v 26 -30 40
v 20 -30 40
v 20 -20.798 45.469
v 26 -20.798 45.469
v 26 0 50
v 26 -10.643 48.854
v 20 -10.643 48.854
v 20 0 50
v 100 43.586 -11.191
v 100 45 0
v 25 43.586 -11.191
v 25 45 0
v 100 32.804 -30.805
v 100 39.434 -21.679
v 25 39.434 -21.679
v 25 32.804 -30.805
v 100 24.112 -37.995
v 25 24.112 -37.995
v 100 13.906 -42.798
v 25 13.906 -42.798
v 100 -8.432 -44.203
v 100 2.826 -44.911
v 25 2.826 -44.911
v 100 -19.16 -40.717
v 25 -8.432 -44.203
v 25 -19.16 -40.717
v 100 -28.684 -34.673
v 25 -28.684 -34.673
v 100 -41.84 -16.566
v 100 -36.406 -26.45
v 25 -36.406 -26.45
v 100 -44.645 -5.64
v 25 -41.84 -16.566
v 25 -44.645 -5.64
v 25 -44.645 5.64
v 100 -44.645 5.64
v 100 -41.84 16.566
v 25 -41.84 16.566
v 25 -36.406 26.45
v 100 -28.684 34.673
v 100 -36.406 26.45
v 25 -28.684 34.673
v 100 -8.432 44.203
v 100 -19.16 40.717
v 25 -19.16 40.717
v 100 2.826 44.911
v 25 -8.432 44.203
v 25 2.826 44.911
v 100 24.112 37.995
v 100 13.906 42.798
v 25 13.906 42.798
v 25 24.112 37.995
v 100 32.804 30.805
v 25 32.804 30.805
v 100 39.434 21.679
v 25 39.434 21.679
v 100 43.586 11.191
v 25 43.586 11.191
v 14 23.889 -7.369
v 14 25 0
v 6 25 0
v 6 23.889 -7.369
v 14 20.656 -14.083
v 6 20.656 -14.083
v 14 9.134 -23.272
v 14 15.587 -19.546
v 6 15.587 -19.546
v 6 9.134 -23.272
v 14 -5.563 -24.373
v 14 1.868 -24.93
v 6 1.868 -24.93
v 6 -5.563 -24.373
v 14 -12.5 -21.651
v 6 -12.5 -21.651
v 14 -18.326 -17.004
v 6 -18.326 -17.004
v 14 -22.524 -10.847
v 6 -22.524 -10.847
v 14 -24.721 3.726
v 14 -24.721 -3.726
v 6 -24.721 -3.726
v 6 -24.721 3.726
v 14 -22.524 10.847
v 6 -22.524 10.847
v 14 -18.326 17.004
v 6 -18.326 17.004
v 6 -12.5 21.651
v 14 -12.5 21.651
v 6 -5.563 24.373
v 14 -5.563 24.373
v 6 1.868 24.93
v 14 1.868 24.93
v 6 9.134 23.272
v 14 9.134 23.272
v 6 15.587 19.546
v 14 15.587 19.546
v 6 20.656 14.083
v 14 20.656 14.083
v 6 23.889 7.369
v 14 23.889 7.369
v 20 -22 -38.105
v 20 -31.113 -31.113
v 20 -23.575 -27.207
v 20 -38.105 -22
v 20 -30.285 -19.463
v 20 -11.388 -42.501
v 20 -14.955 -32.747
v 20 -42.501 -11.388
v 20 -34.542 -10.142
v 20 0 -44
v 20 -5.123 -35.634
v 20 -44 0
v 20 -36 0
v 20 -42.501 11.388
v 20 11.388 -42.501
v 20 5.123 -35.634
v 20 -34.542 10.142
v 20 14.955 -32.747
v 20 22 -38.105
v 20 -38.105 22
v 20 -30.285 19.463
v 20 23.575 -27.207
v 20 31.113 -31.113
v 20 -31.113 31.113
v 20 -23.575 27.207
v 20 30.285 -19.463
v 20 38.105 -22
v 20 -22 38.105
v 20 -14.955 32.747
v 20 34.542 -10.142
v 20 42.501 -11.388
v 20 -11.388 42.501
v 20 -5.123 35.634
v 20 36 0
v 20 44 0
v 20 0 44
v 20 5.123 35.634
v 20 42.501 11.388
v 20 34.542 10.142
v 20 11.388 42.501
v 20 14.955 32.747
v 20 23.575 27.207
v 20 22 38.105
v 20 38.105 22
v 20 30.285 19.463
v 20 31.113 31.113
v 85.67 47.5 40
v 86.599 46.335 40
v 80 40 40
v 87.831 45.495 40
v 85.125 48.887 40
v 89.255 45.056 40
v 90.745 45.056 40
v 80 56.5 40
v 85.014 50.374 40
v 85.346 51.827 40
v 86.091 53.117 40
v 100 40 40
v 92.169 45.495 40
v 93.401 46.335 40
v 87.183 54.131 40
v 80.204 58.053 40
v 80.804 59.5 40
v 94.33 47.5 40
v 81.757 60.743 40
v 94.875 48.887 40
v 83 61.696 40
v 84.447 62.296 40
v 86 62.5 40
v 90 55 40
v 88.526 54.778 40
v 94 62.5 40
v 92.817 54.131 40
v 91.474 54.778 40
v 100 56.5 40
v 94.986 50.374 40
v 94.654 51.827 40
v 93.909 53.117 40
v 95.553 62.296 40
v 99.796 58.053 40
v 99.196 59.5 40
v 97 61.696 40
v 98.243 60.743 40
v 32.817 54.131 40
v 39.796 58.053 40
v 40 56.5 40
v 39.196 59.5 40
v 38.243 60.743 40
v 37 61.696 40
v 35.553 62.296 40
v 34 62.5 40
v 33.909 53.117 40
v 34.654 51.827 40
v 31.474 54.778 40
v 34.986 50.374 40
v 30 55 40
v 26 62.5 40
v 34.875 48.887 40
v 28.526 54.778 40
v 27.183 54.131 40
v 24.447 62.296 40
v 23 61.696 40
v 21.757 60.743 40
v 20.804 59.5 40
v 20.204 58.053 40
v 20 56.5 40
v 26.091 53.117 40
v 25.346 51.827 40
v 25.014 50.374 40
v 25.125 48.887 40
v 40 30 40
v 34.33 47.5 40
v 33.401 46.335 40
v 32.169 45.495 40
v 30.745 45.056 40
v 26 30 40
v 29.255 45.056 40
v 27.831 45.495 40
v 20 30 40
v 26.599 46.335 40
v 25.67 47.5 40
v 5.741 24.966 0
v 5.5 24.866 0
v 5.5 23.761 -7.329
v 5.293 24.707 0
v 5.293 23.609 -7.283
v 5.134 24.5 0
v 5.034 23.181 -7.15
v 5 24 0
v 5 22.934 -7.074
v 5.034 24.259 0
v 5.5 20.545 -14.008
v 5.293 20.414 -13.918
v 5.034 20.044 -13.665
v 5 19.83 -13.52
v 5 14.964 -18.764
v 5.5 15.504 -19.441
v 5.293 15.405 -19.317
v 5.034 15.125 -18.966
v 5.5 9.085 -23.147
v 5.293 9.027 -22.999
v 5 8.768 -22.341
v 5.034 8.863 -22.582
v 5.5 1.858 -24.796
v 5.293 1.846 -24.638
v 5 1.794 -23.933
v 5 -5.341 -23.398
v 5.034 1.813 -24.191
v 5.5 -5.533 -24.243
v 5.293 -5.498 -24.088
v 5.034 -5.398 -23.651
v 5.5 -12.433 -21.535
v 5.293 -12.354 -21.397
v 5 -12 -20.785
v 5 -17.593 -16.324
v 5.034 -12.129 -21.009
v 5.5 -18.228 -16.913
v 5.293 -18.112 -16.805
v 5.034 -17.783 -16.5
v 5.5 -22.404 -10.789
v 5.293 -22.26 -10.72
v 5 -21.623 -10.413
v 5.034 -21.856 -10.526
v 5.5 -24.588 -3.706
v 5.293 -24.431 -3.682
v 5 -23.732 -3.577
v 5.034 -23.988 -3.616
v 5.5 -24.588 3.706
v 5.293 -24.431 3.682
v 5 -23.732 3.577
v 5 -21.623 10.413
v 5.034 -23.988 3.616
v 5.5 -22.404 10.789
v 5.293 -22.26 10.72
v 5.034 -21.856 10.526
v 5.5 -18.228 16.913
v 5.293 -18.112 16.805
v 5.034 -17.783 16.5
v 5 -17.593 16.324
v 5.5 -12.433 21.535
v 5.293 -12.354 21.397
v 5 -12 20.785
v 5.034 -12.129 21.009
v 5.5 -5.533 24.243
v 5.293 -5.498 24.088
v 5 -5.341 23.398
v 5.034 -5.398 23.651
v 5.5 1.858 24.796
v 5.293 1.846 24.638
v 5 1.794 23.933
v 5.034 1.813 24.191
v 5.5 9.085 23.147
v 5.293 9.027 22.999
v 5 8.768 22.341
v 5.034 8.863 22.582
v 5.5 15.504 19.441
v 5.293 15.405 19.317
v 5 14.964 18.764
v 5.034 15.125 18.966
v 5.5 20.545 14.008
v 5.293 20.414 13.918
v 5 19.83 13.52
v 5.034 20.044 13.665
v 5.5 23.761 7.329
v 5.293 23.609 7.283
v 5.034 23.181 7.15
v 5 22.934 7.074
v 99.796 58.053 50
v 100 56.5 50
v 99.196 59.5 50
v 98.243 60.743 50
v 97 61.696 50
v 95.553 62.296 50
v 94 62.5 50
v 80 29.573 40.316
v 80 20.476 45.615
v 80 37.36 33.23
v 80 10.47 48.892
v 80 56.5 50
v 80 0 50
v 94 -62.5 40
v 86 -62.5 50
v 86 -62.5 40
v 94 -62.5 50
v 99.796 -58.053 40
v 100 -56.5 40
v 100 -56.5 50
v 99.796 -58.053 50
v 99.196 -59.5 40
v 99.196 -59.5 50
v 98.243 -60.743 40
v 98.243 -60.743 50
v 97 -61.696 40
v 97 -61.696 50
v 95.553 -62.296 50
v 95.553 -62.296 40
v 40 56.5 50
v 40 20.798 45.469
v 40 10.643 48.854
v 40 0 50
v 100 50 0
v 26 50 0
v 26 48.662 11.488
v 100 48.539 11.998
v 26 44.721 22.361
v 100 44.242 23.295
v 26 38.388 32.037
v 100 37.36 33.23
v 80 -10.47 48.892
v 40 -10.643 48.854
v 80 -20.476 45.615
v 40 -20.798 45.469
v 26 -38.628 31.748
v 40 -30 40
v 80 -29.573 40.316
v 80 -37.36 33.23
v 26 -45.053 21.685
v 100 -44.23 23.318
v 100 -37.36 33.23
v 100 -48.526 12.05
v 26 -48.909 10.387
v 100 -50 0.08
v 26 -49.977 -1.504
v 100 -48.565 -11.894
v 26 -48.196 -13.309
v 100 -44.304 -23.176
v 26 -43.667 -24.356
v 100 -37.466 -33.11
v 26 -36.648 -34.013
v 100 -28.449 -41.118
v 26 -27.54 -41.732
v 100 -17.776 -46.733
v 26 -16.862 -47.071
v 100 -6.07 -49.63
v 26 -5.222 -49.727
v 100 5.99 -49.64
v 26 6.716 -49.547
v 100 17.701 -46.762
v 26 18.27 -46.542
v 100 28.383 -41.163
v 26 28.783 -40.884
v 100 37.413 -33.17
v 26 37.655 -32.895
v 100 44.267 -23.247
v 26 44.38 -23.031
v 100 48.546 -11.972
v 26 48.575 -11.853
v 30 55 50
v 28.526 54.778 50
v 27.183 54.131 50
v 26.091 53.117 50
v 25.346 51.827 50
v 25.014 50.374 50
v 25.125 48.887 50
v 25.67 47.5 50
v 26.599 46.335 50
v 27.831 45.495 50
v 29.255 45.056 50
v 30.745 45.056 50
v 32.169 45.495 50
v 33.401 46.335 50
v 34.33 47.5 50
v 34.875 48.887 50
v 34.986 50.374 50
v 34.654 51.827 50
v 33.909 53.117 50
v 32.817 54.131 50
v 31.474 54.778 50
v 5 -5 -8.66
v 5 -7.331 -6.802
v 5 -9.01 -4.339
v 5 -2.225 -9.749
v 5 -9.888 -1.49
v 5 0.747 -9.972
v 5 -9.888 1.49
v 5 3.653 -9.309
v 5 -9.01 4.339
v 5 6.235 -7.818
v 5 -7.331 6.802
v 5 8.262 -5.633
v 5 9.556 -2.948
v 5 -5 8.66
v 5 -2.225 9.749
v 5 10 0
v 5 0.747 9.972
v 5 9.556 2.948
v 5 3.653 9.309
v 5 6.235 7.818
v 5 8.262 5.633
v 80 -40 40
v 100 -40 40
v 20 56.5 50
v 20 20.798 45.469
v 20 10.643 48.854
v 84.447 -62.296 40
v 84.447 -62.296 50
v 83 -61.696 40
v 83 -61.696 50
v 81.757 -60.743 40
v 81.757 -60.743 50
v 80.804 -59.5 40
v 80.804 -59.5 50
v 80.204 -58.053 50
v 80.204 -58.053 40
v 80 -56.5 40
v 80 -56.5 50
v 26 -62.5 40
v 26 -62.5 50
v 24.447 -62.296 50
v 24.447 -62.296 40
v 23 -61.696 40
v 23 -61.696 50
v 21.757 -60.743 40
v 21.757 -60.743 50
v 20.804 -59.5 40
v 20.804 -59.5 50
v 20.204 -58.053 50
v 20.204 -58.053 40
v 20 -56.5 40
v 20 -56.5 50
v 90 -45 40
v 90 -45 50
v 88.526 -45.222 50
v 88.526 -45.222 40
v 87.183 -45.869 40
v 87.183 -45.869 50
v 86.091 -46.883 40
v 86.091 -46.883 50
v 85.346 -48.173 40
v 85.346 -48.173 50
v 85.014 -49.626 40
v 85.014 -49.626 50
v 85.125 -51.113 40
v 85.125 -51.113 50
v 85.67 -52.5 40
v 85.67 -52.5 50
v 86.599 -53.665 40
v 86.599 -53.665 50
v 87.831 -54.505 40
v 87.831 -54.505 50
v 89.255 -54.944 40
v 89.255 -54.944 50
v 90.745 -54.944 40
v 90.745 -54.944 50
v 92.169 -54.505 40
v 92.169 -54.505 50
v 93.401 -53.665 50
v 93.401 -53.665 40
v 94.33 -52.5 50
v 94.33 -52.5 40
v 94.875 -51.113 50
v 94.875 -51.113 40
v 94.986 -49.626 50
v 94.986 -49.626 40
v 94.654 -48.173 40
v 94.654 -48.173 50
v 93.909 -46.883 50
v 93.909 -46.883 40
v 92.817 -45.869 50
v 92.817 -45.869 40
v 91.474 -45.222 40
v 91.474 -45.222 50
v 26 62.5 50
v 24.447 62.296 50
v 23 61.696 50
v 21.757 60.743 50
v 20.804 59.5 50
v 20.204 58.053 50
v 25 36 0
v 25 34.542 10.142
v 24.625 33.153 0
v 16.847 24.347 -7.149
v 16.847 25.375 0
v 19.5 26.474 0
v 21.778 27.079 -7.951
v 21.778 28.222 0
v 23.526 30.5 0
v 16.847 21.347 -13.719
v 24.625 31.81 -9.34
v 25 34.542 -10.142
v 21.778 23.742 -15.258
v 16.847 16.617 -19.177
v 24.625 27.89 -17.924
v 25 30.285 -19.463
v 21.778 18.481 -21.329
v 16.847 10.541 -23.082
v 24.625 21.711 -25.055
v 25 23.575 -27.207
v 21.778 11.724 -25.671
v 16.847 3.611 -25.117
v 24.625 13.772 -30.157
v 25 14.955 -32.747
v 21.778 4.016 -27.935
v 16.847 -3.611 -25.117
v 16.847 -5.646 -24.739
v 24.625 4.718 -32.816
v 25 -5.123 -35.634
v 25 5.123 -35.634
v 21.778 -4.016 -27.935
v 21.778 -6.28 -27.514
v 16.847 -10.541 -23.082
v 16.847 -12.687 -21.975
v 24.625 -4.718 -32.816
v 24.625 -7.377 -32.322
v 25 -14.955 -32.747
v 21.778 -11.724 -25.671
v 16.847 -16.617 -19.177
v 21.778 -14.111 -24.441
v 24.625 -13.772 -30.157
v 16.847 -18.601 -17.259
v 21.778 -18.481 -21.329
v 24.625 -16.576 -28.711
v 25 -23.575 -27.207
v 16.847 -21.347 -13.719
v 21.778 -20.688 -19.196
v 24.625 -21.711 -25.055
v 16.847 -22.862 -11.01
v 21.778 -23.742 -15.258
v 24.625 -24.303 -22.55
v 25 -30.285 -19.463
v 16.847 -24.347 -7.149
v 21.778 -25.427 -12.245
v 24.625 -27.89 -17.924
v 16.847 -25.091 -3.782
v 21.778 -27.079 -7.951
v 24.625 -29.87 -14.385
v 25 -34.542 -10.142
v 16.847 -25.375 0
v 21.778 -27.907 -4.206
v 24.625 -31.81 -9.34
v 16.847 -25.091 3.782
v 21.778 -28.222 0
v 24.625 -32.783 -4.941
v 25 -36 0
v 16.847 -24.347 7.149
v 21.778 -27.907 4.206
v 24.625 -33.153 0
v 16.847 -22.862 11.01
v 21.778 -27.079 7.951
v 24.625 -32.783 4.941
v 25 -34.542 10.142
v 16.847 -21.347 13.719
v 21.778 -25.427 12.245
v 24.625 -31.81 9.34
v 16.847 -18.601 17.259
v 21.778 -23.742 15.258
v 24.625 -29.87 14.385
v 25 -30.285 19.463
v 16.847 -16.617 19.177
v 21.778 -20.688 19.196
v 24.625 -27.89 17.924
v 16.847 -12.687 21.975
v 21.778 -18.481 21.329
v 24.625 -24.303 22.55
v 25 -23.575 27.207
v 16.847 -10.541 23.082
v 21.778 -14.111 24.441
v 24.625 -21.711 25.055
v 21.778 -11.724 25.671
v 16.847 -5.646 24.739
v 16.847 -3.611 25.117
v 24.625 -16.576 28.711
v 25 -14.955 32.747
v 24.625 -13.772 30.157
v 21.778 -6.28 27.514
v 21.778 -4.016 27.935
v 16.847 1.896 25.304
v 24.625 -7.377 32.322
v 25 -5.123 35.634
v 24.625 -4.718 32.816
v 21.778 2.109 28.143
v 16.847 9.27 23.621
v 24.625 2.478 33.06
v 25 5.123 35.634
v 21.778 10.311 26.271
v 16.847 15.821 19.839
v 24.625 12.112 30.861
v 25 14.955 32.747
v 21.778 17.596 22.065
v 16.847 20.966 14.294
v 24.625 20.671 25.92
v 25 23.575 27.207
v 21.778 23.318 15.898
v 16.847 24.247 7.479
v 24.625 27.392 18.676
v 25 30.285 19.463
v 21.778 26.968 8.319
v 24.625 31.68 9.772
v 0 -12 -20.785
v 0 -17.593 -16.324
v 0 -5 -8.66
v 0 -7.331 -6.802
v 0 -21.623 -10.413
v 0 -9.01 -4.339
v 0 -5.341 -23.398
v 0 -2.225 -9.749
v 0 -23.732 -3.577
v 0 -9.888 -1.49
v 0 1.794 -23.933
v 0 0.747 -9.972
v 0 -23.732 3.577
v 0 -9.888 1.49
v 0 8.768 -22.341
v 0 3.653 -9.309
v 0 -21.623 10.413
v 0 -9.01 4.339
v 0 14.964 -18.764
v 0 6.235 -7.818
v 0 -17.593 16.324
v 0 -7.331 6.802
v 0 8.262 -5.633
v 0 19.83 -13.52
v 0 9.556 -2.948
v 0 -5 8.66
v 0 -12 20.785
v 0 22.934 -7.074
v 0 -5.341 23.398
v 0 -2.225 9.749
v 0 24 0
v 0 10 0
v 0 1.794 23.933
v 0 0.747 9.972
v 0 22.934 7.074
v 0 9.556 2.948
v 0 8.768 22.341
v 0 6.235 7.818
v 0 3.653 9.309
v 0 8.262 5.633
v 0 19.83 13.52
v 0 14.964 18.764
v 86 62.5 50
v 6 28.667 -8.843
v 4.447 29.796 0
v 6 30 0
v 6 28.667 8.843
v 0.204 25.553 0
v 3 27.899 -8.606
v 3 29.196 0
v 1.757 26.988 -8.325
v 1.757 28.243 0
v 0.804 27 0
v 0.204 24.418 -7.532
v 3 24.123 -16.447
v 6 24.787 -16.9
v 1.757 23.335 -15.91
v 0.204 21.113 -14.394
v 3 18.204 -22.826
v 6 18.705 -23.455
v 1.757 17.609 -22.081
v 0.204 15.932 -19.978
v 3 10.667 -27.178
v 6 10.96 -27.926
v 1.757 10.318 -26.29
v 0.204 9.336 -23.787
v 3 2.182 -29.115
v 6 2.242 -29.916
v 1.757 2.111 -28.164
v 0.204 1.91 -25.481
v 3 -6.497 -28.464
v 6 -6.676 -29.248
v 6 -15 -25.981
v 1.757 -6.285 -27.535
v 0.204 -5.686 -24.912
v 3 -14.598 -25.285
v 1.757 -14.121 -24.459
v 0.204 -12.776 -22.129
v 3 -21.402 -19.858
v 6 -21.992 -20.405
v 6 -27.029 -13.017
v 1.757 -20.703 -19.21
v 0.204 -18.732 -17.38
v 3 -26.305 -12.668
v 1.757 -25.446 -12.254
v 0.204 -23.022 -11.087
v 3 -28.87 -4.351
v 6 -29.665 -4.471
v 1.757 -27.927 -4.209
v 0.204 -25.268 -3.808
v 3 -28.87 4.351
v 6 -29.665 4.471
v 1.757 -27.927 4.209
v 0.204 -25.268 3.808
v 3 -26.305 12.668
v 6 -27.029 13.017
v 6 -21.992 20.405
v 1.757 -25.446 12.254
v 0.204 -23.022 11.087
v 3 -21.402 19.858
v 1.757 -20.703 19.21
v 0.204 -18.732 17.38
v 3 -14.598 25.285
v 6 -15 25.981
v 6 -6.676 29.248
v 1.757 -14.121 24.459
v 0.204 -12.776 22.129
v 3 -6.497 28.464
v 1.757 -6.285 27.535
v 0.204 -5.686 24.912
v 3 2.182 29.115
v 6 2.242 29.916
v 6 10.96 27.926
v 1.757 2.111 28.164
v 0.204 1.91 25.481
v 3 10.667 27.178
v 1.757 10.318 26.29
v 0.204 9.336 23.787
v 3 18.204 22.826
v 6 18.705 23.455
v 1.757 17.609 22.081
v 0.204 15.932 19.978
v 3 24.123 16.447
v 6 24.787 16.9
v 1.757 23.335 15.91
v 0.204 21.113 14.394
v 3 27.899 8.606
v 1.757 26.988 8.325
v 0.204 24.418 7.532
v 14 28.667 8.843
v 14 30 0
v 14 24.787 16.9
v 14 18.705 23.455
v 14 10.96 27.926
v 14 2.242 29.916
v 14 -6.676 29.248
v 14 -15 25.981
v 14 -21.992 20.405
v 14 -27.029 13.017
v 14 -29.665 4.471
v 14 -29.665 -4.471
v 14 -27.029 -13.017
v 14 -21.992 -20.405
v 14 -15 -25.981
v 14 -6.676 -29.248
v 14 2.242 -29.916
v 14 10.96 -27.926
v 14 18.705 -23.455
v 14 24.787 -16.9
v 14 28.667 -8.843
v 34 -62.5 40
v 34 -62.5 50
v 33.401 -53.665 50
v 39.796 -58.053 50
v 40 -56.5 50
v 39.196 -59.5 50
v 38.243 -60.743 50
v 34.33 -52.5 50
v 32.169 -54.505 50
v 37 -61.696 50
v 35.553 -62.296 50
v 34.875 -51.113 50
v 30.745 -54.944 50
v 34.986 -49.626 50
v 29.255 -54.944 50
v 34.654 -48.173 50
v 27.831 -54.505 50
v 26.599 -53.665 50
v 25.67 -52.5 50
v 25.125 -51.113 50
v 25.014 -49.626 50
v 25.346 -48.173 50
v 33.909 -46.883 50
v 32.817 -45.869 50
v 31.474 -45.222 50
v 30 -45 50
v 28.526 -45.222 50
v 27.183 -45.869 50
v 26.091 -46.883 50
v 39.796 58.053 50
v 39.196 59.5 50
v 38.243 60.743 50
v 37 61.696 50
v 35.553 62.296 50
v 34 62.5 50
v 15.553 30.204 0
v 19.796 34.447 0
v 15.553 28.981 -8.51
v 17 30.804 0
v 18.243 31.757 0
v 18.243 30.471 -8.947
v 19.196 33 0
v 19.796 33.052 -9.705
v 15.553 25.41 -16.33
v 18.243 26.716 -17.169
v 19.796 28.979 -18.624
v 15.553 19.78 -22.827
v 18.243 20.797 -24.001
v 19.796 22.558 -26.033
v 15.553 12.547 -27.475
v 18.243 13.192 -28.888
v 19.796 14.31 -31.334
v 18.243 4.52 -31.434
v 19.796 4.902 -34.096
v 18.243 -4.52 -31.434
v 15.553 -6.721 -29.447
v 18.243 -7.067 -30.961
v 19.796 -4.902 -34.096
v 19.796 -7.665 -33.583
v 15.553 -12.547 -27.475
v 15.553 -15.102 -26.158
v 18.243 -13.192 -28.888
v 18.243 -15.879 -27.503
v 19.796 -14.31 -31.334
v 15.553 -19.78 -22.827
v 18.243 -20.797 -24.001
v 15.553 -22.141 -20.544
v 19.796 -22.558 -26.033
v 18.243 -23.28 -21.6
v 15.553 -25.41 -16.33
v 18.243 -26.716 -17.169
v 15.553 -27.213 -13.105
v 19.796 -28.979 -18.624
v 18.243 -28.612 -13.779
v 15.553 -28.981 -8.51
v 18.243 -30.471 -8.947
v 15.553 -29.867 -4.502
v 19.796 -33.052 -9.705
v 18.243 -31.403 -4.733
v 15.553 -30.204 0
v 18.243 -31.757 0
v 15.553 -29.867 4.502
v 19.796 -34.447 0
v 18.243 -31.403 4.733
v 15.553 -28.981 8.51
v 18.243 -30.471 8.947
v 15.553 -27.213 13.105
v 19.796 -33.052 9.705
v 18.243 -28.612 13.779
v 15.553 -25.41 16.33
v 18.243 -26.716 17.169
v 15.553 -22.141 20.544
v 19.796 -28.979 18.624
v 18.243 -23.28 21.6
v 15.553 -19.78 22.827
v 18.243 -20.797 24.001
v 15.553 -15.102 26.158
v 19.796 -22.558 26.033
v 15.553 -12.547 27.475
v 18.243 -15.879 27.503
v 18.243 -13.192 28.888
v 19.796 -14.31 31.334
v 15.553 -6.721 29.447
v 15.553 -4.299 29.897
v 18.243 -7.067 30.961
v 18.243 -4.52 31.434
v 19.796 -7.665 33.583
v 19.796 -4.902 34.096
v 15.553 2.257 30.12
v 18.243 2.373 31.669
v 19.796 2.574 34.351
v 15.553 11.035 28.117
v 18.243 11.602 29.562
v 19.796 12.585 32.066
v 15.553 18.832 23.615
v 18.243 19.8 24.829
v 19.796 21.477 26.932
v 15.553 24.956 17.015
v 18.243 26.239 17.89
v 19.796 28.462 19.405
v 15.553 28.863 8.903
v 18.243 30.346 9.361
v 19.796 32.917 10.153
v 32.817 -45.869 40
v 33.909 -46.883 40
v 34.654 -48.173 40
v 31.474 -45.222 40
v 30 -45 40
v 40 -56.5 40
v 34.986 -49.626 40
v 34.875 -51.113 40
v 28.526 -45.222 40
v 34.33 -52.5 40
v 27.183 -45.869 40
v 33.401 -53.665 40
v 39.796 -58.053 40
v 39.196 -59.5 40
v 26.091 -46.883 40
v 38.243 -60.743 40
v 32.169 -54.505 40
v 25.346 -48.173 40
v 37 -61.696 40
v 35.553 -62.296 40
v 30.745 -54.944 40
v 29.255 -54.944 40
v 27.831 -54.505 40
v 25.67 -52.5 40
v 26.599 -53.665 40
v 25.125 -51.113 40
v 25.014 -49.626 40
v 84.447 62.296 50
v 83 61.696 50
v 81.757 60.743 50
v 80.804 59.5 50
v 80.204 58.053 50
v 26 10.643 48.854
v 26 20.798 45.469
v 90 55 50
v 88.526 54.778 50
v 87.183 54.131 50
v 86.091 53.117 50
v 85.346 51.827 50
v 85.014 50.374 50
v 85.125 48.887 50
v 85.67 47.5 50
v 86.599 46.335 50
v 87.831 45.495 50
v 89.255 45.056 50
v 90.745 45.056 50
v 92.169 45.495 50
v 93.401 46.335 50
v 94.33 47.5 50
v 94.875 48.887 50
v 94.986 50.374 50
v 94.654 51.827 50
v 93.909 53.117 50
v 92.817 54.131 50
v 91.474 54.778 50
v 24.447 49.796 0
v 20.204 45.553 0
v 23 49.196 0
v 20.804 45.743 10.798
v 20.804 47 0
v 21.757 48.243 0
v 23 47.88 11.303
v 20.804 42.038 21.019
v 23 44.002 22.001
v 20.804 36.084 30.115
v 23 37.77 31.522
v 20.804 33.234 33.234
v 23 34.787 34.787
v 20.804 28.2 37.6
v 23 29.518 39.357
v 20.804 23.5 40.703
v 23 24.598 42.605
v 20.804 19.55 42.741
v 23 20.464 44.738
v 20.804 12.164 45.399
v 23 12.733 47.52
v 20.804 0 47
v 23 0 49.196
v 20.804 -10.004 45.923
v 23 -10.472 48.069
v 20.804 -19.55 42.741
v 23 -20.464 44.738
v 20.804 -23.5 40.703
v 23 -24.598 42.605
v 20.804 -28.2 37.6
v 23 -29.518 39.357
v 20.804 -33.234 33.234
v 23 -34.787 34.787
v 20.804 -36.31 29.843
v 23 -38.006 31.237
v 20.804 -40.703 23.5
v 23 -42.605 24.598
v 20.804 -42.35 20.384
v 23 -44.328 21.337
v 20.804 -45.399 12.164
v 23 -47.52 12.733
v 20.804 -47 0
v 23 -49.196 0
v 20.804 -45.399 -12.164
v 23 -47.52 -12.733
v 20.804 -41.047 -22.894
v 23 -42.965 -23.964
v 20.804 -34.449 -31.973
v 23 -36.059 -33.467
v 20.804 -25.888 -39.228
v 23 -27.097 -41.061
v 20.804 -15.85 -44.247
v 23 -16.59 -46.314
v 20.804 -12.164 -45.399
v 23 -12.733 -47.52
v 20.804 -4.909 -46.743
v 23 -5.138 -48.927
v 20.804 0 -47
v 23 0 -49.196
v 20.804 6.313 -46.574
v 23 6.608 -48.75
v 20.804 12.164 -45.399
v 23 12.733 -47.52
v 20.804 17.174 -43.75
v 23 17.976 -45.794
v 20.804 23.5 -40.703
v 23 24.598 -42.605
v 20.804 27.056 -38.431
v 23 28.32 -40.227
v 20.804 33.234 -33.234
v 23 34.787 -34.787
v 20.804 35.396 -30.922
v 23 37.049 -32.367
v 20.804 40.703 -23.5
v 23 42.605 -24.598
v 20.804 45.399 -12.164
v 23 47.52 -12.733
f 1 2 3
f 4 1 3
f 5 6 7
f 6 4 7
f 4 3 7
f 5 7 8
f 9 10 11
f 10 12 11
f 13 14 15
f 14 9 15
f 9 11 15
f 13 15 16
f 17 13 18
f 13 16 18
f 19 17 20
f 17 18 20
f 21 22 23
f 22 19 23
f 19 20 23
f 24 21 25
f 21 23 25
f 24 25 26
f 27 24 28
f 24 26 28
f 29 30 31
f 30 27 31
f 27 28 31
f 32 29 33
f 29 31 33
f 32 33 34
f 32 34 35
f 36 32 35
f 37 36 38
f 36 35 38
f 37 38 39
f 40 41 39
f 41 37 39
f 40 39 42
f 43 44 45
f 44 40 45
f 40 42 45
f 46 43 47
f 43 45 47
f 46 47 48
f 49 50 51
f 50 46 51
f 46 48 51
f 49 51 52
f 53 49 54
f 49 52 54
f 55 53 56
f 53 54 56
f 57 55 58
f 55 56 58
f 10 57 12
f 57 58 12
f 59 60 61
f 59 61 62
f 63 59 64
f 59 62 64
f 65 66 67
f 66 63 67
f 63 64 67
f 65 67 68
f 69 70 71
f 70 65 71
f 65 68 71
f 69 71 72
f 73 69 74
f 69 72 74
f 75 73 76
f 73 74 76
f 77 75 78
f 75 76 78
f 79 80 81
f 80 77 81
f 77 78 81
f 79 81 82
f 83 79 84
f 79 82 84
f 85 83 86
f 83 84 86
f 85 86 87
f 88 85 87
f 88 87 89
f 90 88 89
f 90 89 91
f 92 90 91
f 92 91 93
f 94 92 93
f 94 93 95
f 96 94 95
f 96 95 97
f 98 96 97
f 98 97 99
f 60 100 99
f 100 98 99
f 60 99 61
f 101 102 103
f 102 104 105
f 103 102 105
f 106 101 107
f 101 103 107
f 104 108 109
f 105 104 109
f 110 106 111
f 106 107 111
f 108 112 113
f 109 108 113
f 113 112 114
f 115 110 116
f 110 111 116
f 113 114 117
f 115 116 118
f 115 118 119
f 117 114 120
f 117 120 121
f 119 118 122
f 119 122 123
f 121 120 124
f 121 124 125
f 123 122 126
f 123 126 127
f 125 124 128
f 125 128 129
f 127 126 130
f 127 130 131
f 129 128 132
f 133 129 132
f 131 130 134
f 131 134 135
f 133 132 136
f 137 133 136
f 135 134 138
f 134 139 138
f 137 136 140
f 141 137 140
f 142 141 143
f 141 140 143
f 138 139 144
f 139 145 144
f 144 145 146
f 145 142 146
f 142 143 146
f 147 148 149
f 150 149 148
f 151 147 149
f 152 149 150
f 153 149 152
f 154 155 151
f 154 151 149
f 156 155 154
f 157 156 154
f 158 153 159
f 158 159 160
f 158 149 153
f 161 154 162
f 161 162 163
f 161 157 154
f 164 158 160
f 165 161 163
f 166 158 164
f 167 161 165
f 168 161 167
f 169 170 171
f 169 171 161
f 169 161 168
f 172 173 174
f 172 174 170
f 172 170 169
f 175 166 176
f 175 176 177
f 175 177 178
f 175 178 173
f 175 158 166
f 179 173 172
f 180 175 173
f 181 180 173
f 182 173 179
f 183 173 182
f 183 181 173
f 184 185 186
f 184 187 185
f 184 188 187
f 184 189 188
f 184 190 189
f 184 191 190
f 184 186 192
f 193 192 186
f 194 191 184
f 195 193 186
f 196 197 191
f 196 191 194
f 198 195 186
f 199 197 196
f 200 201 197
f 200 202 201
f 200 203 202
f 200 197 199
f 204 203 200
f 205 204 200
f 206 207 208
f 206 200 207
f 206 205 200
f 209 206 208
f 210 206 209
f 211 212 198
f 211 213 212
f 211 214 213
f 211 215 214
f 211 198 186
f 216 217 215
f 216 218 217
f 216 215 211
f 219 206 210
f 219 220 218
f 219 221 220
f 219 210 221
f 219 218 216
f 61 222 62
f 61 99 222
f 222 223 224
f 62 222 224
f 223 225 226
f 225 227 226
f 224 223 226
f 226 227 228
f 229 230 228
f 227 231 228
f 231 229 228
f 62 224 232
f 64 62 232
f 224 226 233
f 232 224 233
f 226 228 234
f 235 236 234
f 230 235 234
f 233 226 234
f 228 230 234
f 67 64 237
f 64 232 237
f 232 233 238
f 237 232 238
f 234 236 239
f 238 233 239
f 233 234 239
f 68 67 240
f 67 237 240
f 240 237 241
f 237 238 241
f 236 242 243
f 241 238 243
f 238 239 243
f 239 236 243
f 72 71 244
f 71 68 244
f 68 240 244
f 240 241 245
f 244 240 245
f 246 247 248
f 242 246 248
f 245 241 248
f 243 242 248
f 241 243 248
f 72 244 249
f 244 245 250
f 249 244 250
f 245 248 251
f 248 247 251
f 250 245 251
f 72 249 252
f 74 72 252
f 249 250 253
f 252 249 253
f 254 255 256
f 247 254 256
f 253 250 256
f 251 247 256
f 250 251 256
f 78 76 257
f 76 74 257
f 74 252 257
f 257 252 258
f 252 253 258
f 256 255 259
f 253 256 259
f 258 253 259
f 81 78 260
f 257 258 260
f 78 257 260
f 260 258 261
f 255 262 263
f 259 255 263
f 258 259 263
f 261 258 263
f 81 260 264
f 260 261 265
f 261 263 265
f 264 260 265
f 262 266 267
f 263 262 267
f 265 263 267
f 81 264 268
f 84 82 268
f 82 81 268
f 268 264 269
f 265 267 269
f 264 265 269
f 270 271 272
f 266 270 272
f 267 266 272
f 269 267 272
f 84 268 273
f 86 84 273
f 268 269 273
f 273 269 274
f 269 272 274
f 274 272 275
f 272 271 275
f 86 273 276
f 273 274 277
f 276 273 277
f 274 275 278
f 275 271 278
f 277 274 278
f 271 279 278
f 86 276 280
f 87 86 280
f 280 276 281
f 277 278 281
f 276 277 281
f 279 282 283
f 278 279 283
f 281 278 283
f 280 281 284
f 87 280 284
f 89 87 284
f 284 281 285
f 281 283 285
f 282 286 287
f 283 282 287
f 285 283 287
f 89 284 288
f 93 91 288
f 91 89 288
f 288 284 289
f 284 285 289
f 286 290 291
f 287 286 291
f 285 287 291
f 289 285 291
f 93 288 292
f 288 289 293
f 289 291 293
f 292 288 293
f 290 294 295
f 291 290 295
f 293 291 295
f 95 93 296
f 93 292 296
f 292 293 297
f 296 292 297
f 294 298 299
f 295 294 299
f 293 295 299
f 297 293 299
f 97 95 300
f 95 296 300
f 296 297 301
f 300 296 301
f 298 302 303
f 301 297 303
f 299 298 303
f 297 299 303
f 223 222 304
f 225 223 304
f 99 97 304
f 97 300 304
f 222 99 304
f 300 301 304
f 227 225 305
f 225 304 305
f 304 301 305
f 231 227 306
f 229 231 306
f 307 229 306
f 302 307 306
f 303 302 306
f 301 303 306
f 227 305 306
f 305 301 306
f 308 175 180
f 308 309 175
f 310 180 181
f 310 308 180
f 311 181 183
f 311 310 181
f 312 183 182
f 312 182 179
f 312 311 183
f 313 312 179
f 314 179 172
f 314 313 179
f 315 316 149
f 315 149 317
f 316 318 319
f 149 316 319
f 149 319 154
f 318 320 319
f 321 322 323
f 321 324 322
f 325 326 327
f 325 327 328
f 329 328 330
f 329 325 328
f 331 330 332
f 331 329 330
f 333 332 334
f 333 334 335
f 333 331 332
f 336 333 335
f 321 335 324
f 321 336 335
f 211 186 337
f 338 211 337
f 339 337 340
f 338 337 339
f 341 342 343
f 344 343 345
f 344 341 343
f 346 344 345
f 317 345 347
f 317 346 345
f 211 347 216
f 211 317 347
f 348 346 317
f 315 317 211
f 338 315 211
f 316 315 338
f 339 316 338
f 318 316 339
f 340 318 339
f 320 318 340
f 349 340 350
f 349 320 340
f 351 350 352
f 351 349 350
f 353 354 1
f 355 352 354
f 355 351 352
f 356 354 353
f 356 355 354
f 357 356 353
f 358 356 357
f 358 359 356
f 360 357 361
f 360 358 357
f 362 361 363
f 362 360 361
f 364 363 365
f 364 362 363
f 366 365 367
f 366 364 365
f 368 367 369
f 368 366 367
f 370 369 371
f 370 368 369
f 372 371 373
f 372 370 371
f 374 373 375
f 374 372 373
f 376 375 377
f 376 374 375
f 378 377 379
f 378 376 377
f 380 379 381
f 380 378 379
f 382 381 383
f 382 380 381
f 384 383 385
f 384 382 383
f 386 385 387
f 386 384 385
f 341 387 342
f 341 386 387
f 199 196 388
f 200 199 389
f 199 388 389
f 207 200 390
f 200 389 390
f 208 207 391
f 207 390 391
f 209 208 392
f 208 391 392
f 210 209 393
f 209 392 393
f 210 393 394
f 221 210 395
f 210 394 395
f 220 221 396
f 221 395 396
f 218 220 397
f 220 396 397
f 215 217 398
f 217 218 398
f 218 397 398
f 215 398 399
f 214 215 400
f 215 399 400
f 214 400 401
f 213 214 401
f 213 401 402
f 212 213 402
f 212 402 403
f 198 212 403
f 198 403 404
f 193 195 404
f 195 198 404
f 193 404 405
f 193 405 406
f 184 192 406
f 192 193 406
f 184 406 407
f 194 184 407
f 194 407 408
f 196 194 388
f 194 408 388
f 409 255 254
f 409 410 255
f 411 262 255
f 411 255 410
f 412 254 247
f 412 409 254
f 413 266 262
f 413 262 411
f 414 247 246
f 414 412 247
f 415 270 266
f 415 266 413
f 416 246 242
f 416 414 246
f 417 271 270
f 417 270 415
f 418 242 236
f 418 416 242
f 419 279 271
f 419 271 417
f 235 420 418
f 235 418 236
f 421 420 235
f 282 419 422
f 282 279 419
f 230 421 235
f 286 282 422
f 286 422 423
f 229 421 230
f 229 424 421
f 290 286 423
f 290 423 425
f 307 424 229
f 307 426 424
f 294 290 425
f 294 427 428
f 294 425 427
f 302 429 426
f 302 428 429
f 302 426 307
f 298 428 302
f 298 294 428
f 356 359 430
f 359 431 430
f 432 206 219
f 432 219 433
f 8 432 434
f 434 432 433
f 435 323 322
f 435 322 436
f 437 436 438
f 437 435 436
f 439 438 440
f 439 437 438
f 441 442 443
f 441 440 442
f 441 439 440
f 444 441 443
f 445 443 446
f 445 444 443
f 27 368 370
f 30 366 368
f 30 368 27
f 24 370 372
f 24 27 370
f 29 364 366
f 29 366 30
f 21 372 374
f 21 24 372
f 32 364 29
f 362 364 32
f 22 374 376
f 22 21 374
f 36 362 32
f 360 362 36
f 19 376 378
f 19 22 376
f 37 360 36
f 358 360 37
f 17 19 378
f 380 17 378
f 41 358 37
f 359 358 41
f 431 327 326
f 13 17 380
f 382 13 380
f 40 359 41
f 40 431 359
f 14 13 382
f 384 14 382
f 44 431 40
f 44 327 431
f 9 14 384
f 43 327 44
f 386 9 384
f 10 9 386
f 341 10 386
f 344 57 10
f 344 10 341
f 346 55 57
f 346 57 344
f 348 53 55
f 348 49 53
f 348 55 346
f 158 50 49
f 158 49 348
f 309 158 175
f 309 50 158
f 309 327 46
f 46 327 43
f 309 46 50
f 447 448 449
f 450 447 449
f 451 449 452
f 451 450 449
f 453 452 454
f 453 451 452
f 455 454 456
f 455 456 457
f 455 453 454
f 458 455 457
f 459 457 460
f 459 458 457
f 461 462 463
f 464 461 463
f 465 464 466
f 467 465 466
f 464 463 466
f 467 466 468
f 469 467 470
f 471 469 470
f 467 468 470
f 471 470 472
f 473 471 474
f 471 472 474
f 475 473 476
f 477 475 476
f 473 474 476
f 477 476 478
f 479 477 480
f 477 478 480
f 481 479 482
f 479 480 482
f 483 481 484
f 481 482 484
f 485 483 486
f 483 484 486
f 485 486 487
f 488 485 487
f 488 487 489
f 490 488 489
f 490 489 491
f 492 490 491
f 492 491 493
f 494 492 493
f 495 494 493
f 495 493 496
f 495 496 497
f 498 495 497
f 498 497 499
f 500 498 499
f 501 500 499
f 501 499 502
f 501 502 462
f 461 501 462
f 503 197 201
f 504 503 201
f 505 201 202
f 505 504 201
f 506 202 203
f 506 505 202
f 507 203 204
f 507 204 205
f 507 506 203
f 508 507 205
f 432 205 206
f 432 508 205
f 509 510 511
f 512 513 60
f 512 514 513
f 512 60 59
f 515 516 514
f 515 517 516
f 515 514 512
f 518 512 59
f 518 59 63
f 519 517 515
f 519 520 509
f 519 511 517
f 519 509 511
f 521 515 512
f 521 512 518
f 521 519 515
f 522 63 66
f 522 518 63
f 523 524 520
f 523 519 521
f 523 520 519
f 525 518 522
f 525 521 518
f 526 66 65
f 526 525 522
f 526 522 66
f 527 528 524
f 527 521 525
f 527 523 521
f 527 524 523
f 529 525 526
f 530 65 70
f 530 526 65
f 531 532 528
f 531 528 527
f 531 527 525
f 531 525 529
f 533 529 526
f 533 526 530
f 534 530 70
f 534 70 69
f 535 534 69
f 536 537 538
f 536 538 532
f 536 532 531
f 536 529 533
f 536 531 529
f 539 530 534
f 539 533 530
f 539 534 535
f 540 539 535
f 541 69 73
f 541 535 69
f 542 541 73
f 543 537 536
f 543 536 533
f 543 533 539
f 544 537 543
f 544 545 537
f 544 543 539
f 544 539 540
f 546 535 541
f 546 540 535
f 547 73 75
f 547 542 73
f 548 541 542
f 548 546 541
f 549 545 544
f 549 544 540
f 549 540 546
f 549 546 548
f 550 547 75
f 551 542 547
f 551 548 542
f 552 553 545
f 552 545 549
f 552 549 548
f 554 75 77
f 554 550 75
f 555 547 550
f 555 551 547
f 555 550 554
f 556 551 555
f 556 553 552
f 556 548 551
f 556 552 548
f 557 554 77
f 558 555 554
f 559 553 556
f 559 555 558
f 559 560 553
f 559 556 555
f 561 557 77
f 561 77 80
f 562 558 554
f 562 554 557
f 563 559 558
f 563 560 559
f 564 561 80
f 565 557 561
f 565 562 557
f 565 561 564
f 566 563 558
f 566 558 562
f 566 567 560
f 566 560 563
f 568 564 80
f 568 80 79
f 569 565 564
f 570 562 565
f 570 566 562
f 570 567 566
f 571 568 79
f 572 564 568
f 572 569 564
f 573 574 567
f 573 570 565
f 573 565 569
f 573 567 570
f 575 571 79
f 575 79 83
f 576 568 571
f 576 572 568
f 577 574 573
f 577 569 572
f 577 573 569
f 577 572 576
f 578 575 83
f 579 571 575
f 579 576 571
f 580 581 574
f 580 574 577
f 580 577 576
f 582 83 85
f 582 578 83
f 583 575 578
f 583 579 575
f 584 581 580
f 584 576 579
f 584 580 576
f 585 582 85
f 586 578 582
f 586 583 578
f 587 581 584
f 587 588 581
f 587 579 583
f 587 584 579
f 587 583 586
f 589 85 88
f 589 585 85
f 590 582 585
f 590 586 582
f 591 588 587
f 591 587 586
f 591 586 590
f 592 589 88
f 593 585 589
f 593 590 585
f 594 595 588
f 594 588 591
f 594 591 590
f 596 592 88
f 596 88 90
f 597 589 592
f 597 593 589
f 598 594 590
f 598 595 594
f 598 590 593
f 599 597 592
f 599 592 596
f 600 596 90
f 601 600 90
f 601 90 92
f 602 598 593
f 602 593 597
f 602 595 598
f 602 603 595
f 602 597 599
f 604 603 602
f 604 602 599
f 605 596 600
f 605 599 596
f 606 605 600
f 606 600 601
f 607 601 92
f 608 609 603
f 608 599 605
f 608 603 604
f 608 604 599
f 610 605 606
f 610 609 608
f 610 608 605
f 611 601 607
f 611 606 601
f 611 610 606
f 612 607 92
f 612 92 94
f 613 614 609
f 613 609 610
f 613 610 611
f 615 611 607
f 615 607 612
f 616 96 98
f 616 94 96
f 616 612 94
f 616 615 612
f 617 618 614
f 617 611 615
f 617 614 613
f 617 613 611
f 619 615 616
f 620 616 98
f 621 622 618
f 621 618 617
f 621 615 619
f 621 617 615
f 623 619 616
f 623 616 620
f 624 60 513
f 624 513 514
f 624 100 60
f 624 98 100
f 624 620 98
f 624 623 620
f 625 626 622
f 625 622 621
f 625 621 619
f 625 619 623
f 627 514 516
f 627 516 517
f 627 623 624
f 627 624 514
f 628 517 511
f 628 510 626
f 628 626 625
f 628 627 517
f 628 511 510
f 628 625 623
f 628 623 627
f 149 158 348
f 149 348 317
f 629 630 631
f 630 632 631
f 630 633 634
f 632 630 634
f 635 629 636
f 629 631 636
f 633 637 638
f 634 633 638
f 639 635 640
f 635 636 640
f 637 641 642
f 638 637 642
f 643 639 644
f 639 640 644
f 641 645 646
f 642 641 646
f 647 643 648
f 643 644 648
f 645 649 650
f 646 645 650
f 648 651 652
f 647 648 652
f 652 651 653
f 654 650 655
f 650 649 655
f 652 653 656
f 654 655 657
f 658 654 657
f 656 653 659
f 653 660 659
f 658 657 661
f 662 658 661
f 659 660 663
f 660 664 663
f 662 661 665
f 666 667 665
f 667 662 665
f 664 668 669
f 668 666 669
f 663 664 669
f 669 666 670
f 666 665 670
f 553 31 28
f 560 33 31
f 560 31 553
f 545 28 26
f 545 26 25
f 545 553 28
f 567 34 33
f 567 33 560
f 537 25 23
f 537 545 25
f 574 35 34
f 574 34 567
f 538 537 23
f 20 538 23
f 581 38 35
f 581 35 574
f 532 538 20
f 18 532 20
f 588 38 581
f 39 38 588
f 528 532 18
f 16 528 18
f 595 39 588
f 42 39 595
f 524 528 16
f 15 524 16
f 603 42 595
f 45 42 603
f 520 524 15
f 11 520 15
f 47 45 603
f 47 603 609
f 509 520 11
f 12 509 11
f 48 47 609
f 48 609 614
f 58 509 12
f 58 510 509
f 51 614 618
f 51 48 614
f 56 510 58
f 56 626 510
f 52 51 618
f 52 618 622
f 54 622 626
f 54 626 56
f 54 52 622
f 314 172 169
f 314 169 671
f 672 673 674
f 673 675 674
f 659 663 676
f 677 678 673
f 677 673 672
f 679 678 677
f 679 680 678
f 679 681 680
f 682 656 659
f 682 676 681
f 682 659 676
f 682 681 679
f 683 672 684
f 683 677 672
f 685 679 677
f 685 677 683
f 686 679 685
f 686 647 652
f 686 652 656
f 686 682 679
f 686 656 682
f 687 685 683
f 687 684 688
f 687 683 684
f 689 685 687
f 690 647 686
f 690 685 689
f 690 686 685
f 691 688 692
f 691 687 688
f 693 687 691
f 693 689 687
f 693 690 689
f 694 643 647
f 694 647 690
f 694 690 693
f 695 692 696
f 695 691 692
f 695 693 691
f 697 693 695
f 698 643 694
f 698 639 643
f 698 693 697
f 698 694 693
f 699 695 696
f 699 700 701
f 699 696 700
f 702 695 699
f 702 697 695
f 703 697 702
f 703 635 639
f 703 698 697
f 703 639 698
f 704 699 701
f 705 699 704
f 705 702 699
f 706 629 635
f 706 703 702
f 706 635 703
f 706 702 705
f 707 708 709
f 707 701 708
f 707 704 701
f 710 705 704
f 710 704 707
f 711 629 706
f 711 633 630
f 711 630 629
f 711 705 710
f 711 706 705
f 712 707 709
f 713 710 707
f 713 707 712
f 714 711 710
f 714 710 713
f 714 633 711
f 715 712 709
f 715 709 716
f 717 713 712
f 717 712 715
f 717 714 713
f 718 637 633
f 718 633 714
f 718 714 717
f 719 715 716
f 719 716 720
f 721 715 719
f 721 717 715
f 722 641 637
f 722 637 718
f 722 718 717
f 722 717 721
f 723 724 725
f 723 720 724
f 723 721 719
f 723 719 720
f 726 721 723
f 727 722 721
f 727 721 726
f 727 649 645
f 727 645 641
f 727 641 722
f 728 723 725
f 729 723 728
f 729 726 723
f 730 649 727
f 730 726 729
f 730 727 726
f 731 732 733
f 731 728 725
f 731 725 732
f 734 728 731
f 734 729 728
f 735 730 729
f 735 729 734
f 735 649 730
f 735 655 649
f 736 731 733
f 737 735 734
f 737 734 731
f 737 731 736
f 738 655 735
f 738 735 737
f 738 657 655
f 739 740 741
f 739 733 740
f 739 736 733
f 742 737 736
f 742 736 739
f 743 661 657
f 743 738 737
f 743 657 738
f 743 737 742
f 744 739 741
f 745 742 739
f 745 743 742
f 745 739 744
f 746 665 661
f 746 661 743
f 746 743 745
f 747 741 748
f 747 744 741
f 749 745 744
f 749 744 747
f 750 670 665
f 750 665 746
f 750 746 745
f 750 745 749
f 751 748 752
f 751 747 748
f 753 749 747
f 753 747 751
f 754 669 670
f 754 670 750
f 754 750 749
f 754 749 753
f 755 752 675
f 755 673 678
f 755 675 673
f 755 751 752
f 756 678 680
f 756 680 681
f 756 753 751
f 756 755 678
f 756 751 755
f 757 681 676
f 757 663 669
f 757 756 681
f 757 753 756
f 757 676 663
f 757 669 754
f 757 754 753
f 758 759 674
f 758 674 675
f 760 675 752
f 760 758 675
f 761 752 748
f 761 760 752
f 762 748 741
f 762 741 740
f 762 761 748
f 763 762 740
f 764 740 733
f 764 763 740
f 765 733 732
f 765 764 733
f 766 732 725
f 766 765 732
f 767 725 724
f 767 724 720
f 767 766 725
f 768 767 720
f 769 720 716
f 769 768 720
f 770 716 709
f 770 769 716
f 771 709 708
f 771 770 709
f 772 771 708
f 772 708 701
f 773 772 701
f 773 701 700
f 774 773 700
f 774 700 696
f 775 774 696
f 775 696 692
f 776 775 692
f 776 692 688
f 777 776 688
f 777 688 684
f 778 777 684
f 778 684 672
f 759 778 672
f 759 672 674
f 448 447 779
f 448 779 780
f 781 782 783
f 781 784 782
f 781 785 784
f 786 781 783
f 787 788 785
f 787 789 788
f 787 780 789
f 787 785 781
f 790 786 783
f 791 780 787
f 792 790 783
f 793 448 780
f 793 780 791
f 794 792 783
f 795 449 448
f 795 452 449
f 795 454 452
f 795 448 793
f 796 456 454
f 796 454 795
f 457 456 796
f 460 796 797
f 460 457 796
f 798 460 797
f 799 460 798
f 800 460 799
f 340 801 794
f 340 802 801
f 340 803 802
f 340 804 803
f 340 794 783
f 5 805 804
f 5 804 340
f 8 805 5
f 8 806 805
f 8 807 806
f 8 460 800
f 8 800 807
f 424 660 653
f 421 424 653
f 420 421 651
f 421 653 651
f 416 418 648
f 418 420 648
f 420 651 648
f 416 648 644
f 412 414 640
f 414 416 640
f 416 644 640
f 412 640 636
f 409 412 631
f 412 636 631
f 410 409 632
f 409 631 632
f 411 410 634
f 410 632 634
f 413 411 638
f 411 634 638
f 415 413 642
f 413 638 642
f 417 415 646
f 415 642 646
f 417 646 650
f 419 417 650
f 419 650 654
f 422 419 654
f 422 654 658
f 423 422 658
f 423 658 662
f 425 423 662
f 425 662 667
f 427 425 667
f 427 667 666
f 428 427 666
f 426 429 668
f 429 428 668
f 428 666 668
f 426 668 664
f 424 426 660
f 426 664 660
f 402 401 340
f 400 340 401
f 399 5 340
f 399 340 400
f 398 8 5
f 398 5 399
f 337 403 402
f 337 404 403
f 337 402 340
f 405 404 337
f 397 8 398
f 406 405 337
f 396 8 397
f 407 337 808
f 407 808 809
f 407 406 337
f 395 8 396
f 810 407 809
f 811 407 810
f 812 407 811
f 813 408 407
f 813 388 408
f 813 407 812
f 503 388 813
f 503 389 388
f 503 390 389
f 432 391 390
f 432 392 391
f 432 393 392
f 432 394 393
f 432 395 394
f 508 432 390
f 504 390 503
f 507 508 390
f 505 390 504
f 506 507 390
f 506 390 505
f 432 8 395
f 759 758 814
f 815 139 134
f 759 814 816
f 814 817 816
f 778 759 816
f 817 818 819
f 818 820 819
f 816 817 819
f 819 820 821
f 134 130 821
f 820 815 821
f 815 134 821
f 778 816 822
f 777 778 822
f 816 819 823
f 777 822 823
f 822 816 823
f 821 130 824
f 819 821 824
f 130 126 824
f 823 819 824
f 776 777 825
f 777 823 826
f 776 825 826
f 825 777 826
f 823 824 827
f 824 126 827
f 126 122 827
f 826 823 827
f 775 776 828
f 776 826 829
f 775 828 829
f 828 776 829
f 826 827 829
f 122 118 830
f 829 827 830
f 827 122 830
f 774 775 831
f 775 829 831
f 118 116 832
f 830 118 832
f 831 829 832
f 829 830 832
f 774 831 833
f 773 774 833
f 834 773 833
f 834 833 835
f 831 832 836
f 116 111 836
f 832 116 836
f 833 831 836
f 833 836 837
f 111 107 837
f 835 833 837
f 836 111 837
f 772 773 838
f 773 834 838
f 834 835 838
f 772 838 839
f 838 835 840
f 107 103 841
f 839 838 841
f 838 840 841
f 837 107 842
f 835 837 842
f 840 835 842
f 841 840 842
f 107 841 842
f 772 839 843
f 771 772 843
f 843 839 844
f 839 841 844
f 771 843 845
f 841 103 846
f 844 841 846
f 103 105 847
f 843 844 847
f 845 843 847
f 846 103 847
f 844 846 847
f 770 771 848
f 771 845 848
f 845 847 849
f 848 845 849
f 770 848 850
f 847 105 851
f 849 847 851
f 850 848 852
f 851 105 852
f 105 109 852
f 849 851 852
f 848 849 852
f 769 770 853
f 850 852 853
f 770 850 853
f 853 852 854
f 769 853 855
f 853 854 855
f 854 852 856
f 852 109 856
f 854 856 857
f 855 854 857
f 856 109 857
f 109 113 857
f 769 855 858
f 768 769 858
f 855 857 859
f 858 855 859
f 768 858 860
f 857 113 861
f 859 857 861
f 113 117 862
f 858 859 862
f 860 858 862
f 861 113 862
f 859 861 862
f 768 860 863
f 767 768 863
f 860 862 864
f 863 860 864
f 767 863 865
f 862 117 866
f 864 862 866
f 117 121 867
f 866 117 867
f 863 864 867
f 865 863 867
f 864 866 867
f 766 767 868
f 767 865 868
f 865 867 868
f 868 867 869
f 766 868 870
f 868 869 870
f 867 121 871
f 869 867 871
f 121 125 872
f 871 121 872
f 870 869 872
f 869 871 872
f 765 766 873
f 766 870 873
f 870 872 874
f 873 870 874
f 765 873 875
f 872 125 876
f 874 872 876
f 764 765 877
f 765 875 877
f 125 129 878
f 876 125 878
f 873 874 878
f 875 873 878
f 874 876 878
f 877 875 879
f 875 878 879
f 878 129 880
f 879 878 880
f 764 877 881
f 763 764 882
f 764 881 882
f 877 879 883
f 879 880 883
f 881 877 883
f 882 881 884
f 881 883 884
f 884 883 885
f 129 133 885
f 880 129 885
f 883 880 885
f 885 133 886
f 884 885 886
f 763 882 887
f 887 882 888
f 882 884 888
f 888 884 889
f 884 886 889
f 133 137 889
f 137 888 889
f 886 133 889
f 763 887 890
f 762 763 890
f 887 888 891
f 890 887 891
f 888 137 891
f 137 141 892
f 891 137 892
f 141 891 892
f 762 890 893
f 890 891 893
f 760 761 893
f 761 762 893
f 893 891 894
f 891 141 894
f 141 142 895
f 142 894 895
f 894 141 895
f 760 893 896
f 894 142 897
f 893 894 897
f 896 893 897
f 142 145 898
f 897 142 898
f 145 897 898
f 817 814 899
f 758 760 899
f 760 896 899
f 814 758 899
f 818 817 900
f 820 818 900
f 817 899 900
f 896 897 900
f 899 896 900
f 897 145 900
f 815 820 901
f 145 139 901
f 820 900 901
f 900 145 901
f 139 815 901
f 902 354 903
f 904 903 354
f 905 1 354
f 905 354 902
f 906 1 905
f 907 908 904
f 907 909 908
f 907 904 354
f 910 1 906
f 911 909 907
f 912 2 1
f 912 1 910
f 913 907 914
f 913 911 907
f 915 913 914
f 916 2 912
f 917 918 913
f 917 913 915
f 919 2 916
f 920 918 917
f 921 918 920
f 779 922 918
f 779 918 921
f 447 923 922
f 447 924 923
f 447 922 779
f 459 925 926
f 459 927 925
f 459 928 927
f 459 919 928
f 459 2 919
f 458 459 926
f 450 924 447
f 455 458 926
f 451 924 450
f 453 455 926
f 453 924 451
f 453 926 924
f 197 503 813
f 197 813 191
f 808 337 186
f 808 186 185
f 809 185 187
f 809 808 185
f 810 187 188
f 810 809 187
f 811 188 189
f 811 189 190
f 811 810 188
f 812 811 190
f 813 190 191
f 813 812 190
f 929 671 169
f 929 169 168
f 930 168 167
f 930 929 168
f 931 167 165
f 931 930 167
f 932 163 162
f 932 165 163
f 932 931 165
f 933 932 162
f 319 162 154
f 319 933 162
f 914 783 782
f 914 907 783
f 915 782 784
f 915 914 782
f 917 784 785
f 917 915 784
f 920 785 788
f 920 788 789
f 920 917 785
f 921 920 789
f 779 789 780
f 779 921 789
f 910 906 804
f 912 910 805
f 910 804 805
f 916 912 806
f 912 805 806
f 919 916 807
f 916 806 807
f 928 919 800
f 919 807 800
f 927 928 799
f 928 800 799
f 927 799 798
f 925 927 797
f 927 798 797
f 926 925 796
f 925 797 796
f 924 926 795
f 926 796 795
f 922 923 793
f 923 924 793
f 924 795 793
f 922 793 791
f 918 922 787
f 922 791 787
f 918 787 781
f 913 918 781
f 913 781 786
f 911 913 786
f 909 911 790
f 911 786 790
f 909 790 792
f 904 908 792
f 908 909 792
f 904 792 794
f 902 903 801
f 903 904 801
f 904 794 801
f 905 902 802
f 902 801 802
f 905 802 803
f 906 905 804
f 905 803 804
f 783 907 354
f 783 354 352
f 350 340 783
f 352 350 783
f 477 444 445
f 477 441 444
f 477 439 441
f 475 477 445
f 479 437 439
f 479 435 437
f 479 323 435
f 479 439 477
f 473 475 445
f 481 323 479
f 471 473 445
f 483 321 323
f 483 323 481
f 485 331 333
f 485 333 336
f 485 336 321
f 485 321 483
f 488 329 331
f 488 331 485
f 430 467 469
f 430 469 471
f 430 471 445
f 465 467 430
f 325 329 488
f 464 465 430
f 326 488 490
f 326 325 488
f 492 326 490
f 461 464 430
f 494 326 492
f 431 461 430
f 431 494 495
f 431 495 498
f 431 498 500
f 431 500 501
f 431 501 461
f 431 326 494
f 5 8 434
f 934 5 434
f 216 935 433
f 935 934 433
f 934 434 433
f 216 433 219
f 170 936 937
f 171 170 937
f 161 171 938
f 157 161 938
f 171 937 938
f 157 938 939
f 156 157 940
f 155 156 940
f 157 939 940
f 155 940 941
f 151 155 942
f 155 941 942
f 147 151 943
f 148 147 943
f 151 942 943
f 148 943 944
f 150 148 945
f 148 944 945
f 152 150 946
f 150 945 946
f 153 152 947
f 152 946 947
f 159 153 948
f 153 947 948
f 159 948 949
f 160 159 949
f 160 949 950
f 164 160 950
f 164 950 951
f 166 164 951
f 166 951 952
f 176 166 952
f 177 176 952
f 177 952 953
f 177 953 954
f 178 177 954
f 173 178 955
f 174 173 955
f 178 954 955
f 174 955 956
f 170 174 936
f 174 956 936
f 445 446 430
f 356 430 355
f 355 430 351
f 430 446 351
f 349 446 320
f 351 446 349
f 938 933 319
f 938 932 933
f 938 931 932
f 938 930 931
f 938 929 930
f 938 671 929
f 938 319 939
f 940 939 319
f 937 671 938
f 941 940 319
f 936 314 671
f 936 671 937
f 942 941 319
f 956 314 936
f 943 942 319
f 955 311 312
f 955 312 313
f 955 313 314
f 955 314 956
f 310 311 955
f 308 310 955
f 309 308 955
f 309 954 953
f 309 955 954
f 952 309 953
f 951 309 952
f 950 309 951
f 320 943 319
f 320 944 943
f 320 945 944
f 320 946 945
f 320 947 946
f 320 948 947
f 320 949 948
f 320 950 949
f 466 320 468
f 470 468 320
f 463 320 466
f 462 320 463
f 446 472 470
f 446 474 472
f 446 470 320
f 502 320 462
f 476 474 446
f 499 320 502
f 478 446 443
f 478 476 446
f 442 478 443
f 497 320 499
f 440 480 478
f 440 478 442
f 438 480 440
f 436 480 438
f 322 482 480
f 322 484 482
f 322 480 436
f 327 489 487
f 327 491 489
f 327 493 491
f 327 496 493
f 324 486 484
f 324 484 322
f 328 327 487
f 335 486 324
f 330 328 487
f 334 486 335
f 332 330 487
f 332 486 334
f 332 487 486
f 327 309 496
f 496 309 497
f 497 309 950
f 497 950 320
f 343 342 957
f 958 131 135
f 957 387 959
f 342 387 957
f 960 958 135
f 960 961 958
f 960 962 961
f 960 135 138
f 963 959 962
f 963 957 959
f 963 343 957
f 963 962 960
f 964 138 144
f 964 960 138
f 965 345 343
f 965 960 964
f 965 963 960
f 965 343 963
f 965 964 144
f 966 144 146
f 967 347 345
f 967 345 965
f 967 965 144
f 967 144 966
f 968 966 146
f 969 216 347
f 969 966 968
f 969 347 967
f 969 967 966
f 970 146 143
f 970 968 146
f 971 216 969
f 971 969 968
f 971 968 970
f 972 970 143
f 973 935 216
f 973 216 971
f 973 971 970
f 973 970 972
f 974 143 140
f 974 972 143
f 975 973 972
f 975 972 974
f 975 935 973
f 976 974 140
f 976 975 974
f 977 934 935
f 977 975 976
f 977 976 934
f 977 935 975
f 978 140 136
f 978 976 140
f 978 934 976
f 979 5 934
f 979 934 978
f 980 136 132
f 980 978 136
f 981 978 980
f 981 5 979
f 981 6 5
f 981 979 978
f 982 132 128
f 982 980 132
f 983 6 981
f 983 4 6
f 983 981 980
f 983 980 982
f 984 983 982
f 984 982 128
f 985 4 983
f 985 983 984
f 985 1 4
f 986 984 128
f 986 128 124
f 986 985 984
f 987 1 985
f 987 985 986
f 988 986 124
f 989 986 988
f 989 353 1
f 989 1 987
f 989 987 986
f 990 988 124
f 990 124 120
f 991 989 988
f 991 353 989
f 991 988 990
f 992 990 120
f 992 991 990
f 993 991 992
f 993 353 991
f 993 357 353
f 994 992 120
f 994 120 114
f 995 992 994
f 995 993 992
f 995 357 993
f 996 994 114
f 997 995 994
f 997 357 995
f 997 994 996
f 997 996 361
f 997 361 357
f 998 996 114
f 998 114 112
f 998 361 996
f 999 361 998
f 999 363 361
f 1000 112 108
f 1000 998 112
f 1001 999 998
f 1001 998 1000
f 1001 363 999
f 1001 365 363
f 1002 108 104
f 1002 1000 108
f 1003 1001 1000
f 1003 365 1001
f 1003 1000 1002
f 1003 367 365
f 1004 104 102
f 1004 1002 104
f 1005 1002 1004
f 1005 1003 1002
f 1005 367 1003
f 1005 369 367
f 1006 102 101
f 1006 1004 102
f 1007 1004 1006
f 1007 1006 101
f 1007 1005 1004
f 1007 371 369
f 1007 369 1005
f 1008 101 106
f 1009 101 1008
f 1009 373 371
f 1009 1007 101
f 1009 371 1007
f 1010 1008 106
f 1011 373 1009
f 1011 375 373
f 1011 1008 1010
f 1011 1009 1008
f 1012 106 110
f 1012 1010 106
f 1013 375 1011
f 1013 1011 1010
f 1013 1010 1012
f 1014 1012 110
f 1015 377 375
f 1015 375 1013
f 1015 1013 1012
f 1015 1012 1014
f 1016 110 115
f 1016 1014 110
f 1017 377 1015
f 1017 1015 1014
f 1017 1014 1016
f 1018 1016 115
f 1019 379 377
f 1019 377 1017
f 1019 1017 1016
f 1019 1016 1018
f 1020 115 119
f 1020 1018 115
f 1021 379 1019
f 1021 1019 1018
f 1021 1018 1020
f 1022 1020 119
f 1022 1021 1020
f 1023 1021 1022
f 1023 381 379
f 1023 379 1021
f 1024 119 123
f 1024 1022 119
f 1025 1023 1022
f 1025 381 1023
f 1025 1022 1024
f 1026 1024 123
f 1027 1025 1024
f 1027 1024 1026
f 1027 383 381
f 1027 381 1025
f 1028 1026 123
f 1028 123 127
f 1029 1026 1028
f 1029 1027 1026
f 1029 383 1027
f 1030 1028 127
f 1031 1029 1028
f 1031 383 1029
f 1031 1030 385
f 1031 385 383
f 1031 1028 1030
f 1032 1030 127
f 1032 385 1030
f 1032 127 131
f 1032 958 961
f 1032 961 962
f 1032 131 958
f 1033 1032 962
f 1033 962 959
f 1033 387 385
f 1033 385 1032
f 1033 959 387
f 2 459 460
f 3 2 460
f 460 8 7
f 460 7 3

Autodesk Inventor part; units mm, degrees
ref_plane "YZ Plane" through (0, 0, 0) normal (1, 0, 0) x (0, 1, 0)
ref_plane "XZ Plane" through (0, 0, 0) normal (0, 1, 0) x (-1, 0, 0)
sketch "Sketch1" plane through (0, 0, 0) normal (0, 0, 1) x (1, 0, 0)
  line L0 (0, 0) -> (22.5769, 0) construction
  line L1 (0, 10) -> (0, 24)
  line L2 (6, 30) -> (14, 30)
  line L3 (20, 36) -> (20, 50)
  line L4 (20, 50) -> (100, 50)
  arc A0 (6, 30) -> (0, 24) centre (6, 24) ccw
  arc A1 (14, 30) -> (20, 36) centre (14, 36) ccw
  line L5 (100, 45) -> (25, 45)
  line L6 (25, 45) -> (25, 36)
  arc A2 (14, 25) -> (25, 36) centre (14, 36) ccw
  line L7 (14, 25) -> (6, 25)
  arc A3 (6, 25) -> (5, 24) centre (6, 24) ccw
  line L8 (5, 24) -> (5, 10)
  line L9 (100, 50) -> (100, 45)
  line L10 (5, 10) -> (0, 10)
  point P0 (20, 30)
  point P1 (0, 17)
  point P2 (20, 43)
  dimension "d0" = 10
  dimension "d1" = 20
  dimension "d2" = 80
  dimension "d3" = 30
  dimension "d4" = 50
  dimension "d5" = 6
  dimension "d6" = 5
revolve "Revolution1" add sketch "Sketch1" angle 360 about axis through (0, 0, 0) along (1, 0, 0)
fillet "Fillet1" radius 6 1 edges at (20, -50, 0)
sketch "Sketch2" plane through (100, 0, 0) normal (1, 0, 0) x (0, 0, -1)
  line L0 (-40, 62.5) -> (-50, 62.5)
  line L1 (-50, 62.5) -> (-50, -62.5)
  line L2 (-50, -62.5) -> (-40, -62.5)
  circle A0 centre (0, 0) radius 50 projected
  line L3 (-40, -62.5) -> (-40, -30)
  line L4 (-40, 30) -> (-40, 62.5)
  point P0 (-45, -62.5)
  point P1 (-50, 0)
  dimension "d9" = 10
  dimension "d10" = 125
  dimension "d11" = 62.5
extrude "Extrusion1" add sketch "Sketch2" against normal blind 20 contours L4 A0 L1 L0 | A0 L3 L2 L1
chamfer "Chamfer1" distance 10 angle 45 2 edges at (90, -30, 40) (90, 30, 40)
fillet "Fillet3" radius 6 4 edges at (100, 62.5, 45) (100, -62.5, 45) (80, -62.5, 45) (80, 62.5, 45)
sketch "Sketch3" plane through (100, -40, 40) normal (0, 0, -1) x (-1, 0, 0)
  line L0 (20, 0) -> (20, -16.5) projected
  line L1 (0, 0) -> (20, 0) projected
  line L2 (20, 96.5) -> (20, 80) projected
  line L3 (20, 80) -> (0, 80) projected
  point P0 (100, 40)
  point P1 (10, -10)
  point P2 (10, 90)
  dimension "d19" = 10
  dimension "d20" = 10
  dimension "d21" = 10
  dimension "d22" = 10
hole "Hole1" at (90, -50, 40) at (90, 50, 40) direction (0, 0, 1) diameter 10 end through all
ref_plane "Work Plane1" through (60, 0, 0) normal (-1, 0, 0) x (0, 0, 1)
mirror "Mirror1" about plane through (60, 0, 0) normal (-1, 0, 0) of "Hole1", "Extrusion1", "Fillet3"
properties part number "Motor"
